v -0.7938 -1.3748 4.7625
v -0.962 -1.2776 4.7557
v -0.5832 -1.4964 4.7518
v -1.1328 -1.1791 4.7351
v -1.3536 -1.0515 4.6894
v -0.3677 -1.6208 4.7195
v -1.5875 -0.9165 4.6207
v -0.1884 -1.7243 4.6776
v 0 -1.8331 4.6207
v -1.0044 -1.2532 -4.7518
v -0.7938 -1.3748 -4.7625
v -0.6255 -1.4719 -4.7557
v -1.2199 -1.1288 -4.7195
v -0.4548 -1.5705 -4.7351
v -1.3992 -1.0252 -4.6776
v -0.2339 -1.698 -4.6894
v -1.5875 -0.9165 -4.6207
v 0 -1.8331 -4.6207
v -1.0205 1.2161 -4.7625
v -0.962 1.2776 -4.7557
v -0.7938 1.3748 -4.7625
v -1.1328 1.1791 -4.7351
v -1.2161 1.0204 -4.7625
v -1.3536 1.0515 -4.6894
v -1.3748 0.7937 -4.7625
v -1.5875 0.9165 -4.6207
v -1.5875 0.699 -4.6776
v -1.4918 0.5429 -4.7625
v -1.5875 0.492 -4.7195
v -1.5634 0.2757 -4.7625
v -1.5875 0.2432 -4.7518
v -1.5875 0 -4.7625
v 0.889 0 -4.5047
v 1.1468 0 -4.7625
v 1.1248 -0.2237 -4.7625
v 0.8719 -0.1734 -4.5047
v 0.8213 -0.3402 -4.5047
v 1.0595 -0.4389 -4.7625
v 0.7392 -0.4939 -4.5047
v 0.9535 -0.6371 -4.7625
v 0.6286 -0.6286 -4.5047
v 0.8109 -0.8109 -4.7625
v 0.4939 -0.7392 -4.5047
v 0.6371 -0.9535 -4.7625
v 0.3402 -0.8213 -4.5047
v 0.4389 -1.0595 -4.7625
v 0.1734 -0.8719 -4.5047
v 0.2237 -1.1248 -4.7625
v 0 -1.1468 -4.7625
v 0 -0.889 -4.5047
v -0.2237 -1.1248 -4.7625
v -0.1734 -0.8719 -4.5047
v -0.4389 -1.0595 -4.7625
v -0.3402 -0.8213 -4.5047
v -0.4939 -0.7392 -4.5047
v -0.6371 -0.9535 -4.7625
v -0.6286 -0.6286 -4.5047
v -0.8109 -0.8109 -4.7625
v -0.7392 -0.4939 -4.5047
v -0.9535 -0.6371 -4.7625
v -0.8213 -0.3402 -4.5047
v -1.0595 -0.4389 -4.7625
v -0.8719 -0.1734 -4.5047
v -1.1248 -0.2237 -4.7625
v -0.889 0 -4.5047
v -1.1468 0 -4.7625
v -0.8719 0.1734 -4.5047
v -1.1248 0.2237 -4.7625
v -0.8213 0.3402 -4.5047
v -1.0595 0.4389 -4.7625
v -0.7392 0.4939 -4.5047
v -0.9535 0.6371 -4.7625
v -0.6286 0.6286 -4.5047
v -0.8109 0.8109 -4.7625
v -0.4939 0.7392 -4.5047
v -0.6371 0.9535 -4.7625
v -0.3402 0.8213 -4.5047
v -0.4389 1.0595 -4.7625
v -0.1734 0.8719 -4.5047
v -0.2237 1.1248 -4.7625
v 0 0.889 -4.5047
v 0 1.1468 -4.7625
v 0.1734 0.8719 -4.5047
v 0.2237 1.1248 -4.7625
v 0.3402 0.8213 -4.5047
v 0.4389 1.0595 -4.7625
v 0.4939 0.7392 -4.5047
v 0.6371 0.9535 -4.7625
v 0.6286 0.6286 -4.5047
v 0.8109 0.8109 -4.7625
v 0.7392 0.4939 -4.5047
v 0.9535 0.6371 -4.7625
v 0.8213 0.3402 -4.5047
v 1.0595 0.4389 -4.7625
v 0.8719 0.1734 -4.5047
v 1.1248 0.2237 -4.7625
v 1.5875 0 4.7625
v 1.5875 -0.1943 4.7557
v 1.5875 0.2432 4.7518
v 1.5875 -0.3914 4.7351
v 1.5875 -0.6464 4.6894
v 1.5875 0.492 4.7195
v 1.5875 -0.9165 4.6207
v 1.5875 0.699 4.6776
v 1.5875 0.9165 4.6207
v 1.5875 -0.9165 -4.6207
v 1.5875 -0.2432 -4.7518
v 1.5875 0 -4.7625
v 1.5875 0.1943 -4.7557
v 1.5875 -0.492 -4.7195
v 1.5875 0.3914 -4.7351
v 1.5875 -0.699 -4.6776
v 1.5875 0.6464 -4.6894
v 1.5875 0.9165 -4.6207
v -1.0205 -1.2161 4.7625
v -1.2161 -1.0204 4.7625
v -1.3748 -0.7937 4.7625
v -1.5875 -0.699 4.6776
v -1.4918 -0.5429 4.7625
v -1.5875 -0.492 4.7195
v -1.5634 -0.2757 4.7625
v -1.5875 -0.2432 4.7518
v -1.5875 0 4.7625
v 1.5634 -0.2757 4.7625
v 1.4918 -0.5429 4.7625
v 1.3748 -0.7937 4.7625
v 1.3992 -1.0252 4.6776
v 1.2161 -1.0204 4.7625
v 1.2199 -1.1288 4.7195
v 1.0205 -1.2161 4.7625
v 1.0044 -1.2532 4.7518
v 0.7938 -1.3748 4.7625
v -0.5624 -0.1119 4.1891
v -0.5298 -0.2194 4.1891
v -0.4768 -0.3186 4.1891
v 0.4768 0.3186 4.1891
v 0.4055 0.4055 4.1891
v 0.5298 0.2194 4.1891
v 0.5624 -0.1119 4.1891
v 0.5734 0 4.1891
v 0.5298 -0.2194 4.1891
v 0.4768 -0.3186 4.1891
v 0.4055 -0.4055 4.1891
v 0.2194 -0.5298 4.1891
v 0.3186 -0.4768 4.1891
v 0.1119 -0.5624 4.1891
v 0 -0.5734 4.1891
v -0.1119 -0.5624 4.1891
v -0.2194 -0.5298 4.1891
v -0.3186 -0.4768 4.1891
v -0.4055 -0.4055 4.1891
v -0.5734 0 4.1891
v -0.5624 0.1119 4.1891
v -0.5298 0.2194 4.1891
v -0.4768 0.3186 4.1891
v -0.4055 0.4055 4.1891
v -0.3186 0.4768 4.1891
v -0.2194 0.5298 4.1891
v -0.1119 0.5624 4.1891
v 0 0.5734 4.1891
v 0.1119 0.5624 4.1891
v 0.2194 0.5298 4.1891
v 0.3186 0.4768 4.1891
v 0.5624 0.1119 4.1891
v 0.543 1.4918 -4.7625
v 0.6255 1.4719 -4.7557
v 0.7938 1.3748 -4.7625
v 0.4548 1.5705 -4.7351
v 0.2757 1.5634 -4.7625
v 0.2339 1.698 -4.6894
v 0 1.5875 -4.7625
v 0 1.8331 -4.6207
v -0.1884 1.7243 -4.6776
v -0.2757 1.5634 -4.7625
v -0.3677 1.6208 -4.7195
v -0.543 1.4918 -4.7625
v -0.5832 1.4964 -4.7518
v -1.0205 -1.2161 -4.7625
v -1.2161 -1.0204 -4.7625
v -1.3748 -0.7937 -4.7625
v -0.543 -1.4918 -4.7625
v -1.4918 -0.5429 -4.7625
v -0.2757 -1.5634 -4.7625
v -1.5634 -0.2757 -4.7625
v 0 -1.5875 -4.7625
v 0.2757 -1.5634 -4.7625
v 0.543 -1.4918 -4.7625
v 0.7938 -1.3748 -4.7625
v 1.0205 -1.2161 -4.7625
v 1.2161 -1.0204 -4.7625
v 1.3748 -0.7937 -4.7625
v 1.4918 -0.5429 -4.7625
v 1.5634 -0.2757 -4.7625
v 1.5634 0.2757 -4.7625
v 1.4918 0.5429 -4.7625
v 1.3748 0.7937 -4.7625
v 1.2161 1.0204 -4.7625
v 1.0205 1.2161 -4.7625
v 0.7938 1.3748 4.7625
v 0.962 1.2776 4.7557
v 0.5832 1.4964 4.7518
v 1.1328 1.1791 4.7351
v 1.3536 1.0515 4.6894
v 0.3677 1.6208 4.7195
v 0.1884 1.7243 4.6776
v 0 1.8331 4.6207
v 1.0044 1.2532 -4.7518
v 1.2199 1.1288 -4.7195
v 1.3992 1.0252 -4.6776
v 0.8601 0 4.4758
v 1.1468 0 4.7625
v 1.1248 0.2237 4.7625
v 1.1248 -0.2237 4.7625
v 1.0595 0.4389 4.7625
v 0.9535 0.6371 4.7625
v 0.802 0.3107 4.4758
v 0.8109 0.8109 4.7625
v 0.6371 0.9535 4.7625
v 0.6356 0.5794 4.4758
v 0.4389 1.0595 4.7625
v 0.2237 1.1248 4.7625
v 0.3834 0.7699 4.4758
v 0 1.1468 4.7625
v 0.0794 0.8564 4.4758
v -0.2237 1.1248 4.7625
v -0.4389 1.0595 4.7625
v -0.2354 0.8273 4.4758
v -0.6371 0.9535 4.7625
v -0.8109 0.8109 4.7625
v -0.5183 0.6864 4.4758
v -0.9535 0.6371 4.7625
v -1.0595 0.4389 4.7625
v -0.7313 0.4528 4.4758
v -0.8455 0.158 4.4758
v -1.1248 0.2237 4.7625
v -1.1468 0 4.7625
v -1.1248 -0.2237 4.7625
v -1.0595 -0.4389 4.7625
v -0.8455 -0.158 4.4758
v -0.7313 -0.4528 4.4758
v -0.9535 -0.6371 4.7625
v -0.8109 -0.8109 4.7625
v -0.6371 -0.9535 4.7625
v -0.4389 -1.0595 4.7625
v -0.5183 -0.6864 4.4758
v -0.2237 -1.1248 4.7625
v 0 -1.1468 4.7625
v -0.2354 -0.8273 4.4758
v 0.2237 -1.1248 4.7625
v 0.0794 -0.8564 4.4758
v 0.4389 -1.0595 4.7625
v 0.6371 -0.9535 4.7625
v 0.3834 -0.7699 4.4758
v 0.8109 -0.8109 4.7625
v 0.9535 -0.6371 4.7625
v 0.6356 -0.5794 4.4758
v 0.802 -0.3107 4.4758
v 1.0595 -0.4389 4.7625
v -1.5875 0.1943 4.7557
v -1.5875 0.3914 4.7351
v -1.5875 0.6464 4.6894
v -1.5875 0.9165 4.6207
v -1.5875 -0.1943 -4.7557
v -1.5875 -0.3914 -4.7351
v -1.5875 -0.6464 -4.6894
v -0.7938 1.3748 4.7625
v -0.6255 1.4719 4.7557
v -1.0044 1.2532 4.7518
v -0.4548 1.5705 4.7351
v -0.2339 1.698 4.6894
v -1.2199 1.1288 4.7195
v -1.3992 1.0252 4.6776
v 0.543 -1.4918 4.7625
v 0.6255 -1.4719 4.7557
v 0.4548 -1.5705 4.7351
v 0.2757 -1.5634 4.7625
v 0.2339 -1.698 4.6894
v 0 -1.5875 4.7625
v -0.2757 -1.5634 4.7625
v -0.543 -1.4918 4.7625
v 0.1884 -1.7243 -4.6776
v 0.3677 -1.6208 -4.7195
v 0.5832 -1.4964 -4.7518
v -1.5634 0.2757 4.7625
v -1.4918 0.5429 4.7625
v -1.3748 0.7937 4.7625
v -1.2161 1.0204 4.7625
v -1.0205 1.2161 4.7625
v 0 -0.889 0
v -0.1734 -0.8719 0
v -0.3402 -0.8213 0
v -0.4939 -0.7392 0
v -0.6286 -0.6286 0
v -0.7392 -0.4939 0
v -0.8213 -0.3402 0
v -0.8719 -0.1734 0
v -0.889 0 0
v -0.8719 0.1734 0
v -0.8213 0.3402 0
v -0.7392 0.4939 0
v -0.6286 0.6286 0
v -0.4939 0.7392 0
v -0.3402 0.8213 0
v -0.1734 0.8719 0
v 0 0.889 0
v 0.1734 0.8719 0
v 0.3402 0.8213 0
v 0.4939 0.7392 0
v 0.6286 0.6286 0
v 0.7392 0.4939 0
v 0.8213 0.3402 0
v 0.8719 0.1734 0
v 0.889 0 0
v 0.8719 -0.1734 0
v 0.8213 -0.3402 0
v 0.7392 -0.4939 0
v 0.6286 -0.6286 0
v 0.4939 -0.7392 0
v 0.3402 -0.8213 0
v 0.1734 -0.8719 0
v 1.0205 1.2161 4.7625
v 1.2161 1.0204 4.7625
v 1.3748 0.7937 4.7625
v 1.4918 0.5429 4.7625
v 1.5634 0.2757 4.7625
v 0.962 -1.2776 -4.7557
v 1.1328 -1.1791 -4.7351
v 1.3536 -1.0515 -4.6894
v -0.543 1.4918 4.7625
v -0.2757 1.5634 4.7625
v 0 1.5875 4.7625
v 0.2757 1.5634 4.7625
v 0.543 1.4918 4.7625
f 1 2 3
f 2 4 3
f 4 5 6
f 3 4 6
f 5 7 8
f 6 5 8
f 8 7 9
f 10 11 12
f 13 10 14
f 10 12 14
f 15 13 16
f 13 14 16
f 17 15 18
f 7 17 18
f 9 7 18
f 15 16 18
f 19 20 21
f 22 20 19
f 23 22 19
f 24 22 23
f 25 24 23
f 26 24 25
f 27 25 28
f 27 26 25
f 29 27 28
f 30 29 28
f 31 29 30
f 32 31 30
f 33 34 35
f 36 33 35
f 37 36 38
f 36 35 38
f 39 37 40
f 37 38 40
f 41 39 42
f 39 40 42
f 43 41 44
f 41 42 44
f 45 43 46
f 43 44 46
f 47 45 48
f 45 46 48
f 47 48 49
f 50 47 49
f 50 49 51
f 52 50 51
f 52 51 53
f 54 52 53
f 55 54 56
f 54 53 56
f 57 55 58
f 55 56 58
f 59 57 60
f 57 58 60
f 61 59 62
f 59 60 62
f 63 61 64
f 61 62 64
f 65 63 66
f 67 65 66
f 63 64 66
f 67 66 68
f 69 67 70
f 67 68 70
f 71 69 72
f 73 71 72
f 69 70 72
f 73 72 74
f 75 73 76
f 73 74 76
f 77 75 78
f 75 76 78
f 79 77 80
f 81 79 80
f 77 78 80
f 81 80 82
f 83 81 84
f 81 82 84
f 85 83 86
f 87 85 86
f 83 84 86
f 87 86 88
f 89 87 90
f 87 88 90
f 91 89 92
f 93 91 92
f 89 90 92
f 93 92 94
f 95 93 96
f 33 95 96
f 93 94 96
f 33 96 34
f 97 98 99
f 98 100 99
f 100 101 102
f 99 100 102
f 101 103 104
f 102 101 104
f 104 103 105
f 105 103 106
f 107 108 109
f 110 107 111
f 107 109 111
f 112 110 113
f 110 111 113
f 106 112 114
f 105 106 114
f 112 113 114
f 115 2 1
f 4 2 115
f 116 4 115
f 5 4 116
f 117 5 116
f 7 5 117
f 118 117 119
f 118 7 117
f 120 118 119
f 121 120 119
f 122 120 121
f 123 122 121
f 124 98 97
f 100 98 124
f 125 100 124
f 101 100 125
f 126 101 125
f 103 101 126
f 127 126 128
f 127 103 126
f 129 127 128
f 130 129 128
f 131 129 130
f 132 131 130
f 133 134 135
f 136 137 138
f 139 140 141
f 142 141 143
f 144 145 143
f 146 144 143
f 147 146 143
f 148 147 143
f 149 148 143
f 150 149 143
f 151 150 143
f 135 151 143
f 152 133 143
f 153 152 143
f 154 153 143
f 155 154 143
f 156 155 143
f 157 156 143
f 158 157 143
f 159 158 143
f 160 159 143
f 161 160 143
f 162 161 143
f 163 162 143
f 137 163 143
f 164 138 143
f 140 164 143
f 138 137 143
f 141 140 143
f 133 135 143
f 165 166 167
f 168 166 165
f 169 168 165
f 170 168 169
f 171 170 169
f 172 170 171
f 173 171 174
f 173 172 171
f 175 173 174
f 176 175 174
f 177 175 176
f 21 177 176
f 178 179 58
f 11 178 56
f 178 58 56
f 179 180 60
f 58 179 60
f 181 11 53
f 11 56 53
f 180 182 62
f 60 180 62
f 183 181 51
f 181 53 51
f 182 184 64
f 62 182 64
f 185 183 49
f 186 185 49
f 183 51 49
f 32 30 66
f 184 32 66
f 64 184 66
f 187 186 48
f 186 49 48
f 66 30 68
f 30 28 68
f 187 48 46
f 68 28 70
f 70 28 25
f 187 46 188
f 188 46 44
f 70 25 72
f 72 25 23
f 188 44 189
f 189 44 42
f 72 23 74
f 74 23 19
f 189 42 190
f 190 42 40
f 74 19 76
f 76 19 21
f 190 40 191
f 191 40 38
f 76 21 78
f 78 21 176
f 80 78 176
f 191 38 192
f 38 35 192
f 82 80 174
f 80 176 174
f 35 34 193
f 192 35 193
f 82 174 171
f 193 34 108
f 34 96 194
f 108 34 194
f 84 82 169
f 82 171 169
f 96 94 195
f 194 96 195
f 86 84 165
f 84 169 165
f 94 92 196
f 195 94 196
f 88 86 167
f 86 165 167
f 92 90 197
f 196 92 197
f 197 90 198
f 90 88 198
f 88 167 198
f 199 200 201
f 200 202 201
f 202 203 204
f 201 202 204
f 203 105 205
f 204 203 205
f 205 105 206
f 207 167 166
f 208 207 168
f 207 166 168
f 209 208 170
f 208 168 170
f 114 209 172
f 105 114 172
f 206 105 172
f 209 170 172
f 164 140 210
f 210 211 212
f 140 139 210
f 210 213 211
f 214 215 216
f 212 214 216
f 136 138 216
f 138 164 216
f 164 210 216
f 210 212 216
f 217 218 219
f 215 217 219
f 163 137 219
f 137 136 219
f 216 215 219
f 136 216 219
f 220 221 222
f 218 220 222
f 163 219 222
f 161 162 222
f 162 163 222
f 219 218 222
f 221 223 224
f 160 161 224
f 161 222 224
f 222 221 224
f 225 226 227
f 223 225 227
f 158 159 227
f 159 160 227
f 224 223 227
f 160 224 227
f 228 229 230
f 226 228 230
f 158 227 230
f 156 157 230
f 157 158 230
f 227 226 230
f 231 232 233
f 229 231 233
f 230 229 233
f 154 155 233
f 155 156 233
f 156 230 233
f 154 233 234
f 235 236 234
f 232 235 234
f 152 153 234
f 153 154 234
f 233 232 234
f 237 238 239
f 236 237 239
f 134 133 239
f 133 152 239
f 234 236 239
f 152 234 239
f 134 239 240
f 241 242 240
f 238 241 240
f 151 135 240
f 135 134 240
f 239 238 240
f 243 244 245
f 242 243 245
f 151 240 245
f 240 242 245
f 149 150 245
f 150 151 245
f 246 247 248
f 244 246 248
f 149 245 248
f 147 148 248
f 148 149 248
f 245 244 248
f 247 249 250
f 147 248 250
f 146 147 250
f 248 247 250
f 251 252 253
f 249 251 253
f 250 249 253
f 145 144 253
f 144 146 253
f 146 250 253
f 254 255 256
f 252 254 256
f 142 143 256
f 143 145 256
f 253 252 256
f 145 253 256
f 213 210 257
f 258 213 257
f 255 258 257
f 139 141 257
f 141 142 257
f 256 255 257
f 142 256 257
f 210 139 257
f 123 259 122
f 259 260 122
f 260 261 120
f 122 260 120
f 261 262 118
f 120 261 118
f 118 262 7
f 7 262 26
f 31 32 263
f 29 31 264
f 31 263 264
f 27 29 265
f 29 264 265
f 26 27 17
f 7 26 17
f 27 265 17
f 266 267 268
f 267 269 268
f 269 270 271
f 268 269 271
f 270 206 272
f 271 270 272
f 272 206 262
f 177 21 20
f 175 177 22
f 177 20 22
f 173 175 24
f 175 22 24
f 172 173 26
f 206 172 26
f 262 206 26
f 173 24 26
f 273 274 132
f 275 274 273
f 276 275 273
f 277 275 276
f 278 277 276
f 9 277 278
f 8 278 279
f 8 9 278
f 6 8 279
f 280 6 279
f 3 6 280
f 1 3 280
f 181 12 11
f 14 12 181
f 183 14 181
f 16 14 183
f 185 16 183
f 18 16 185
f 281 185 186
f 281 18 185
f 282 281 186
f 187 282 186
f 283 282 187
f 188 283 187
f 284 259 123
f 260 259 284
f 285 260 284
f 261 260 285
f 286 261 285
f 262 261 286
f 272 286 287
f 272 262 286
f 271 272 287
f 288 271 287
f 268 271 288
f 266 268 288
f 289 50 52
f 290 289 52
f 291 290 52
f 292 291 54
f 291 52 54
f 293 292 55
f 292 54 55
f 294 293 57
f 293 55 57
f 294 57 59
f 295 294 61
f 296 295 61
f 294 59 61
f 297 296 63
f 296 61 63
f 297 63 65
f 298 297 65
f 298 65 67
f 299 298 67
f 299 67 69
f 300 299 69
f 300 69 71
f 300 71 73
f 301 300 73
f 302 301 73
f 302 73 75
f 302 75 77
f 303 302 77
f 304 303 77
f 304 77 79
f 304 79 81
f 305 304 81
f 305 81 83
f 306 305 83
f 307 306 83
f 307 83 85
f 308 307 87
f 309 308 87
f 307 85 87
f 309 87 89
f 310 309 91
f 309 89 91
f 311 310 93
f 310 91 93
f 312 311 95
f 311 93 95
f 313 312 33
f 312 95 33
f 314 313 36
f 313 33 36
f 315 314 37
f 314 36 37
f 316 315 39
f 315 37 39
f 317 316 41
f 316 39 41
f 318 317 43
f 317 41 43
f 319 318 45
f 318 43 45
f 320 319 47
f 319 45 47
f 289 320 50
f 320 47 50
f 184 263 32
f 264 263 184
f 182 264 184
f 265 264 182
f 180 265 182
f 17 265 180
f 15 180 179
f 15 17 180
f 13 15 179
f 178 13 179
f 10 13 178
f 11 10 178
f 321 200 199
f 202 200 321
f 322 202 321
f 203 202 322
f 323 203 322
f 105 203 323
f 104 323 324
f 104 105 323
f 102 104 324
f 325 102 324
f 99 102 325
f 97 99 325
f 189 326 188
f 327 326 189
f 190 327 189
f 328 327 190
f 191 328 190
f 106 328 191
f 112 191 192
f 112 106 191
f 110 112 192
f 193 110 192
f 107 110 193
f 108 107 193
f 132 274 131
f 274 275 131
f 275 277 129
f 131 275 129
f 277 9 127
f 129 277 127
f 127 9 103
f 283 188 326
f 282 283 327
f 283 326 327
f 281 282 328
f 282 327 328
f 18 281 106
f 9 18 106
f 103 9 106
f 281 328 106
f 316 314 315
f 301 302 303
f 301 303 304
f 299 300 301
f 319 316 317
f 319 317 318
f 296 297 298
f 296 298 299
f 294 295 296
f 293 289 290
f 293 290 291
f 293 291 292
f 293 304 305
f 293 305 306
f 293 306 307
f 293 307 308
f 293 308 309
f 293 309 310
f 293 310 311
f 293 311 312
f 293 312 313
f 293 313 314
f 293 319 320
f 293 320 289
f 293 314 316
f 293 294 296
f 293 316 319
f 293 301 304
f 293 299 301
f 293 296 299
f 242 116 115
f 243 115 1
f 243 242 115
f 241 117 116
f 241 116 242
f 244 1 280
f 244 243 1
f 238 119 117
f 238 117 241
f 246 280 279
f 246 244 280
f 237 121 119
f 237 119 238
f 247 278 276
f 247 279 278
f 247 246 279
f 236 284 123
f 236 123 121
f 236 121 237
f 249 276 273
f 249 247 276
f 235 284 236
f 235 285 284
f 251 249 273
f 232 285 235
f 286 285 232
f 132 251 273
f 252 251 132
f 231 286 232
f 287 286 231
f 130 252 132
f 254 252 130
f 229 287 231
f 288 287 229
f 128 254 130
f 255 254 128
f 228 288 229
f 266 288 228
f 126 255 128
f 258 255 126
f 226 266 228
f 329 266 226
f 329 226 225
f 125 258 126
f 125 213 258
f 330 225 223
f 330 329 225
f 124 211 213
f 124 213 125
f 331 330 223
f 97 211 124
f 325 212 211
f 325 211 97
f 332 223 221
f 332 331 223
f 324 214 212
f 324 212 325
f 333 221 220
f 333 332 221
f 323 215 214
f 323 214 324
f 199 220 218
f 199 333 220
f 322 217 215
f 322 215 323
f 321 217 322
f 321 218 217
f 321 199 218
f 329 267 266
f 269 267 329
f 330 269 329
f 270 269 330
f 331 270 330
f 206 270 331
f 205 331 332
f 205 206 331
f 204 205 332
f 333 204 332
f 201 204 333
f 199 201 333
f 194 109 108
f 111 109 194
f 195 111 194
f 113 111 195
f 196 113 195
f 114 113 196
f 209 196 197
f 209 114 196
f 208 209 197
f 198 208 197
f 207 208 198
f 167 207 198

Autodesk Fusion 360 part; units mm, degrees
sketch "Sketch1" plane through (0, 0, 0) normal (0, 0, 1) x (1, 0, 0)
  line L0 (1.5875, 0.9165) -> (0, 1.8331)
  line L1 (0, 1.8331) -> (-1.5875, 0.9165)
  line L2 (-1.5875, 0.9165) -> (-1.5875, -0.9165)
  line L3 (-1.5875, -0.9165) -> (0, -1.8331)
  line L4 (0, -1.8331) -> (1.5875, -0.9165)
  line L5 (1.5875, -0.9165) -> (1.5875, 0.9165)
  circle A0 centre (0, 0) radius 1.5875 construction
  dimension "d4" = 3.175
extrude "Extrude1" add sketch "Sketch1" along normal mid plane 9.525
sketch "Sketch2" plane through (0, 0, 0) normal (1, 0, 0) x (0, 1, 0)
  line L0 (1.8331, 4.7625) -> (-1.8331, 4.7625)
  line L1 (-1.8331, -4.7625) -> (1.8331, -4.7625)
  line L2 (-1.5875, 0) -> (-1.5875, 4.7625) construction
  line L3 (-1.5875, 0) -> (-1.5875, -4.7625) construction
  line L4 (-1.8331, 4.7625) -> (-1.8331, 4.6207)
  line L5 (-1.8331, 4.6207) -> (-1.5875, 4.7625)
  line L6 (-1.5875, 0) -> (0, 0) construction
  line L7 (0, 0) -> (0, 4.7625)
  line L8 (-1.8331, -4.6207) -> (-1.5875, -4.7625)
  line L9 (-1.8331, -4.7625) -> (-1.8331, -4.6207)
  point P0 (-1.5875, 0)
  point P1 (1.5875, 0)
  dimension "d7" = 30
revolve "Revolve1" cut sketch "Sketch2" angle 360 about axis through (0, 0, 0) along (0, 0, 1)
sketch "Sketch3" plane through (0, 0, 0) normal (0, 1, 0) x (1, 0, 0)
  line L0 (-1.5875, -4.7625) -> (1.5875, -4.7625)
  line L1 (1.5875, 4.7625) -> (-1.5875, 4.7625)
  line L2 (0, -4.7625) -> (0, 4.7625)
  line L3 (0, -4.1891) -> (0.5734, -4.1891)
  line L4 (0.5734, -4.1891) -> (1.1468, -4.7625)
  line L5 (0, 0) -> (1.5875, 0) construction
  line L6 (0, 4.1891) -> (0.5734, 4.1891)
  line L7 (0.5734, 4.1891) -> (1.1468, 4.7625)
  dimension "d9" = 45
  dimension "d10" = 2.2936
  dimension "d11" = 1.1468
sketch "Sketch4" plane through (0, 0, 4.7625) normal (0, 0, 1) x (-1, 0, 0)
  arc A0 (-0.7937, -1.3748) -> (0.7937, -1.3748) centre (0, 0) ccw
  arc A1 (0.7937, -1.3748) -> (1.5875, 0) centre (0, 0) ccw
  arc A2 (1.5875, 0) -> (0.7937, 1.3748) centre (0, 0) ccw
  arc A3 (0.7937, 1.3748) -> (-0.7937, 1.3748) centre (0, 0) ccw
  arc A4 (-0.7937, 1.3748) -> (-1.5875, 0) centre (0, 0) ccw
  arc A5 (-1.5875, 0) -> (-0.7937, -1.3748) centre (0, 0) ccw
hole "Hole1" at (0, 0, 0) direction (0, 0, -1) diameter 1.778 end through all
revolve "Revolve2" cut sketch "Sketch3" angle 360 about axis through (0, 0, 4.7625) along (0, 0, -1)
equation "Length = ( 3 / 8 ) * 1 in"
equation "HexWidth = ( 1 / 8 ) * 1 in"
equation "MajorDia = 0.086 in"
equation "d4 = HexWidth"
equation "d5 = Length"
equation "d10 = MajorDia * 1.05"
equation "d11 = d10 / 2"
properties part number "91780A028"
